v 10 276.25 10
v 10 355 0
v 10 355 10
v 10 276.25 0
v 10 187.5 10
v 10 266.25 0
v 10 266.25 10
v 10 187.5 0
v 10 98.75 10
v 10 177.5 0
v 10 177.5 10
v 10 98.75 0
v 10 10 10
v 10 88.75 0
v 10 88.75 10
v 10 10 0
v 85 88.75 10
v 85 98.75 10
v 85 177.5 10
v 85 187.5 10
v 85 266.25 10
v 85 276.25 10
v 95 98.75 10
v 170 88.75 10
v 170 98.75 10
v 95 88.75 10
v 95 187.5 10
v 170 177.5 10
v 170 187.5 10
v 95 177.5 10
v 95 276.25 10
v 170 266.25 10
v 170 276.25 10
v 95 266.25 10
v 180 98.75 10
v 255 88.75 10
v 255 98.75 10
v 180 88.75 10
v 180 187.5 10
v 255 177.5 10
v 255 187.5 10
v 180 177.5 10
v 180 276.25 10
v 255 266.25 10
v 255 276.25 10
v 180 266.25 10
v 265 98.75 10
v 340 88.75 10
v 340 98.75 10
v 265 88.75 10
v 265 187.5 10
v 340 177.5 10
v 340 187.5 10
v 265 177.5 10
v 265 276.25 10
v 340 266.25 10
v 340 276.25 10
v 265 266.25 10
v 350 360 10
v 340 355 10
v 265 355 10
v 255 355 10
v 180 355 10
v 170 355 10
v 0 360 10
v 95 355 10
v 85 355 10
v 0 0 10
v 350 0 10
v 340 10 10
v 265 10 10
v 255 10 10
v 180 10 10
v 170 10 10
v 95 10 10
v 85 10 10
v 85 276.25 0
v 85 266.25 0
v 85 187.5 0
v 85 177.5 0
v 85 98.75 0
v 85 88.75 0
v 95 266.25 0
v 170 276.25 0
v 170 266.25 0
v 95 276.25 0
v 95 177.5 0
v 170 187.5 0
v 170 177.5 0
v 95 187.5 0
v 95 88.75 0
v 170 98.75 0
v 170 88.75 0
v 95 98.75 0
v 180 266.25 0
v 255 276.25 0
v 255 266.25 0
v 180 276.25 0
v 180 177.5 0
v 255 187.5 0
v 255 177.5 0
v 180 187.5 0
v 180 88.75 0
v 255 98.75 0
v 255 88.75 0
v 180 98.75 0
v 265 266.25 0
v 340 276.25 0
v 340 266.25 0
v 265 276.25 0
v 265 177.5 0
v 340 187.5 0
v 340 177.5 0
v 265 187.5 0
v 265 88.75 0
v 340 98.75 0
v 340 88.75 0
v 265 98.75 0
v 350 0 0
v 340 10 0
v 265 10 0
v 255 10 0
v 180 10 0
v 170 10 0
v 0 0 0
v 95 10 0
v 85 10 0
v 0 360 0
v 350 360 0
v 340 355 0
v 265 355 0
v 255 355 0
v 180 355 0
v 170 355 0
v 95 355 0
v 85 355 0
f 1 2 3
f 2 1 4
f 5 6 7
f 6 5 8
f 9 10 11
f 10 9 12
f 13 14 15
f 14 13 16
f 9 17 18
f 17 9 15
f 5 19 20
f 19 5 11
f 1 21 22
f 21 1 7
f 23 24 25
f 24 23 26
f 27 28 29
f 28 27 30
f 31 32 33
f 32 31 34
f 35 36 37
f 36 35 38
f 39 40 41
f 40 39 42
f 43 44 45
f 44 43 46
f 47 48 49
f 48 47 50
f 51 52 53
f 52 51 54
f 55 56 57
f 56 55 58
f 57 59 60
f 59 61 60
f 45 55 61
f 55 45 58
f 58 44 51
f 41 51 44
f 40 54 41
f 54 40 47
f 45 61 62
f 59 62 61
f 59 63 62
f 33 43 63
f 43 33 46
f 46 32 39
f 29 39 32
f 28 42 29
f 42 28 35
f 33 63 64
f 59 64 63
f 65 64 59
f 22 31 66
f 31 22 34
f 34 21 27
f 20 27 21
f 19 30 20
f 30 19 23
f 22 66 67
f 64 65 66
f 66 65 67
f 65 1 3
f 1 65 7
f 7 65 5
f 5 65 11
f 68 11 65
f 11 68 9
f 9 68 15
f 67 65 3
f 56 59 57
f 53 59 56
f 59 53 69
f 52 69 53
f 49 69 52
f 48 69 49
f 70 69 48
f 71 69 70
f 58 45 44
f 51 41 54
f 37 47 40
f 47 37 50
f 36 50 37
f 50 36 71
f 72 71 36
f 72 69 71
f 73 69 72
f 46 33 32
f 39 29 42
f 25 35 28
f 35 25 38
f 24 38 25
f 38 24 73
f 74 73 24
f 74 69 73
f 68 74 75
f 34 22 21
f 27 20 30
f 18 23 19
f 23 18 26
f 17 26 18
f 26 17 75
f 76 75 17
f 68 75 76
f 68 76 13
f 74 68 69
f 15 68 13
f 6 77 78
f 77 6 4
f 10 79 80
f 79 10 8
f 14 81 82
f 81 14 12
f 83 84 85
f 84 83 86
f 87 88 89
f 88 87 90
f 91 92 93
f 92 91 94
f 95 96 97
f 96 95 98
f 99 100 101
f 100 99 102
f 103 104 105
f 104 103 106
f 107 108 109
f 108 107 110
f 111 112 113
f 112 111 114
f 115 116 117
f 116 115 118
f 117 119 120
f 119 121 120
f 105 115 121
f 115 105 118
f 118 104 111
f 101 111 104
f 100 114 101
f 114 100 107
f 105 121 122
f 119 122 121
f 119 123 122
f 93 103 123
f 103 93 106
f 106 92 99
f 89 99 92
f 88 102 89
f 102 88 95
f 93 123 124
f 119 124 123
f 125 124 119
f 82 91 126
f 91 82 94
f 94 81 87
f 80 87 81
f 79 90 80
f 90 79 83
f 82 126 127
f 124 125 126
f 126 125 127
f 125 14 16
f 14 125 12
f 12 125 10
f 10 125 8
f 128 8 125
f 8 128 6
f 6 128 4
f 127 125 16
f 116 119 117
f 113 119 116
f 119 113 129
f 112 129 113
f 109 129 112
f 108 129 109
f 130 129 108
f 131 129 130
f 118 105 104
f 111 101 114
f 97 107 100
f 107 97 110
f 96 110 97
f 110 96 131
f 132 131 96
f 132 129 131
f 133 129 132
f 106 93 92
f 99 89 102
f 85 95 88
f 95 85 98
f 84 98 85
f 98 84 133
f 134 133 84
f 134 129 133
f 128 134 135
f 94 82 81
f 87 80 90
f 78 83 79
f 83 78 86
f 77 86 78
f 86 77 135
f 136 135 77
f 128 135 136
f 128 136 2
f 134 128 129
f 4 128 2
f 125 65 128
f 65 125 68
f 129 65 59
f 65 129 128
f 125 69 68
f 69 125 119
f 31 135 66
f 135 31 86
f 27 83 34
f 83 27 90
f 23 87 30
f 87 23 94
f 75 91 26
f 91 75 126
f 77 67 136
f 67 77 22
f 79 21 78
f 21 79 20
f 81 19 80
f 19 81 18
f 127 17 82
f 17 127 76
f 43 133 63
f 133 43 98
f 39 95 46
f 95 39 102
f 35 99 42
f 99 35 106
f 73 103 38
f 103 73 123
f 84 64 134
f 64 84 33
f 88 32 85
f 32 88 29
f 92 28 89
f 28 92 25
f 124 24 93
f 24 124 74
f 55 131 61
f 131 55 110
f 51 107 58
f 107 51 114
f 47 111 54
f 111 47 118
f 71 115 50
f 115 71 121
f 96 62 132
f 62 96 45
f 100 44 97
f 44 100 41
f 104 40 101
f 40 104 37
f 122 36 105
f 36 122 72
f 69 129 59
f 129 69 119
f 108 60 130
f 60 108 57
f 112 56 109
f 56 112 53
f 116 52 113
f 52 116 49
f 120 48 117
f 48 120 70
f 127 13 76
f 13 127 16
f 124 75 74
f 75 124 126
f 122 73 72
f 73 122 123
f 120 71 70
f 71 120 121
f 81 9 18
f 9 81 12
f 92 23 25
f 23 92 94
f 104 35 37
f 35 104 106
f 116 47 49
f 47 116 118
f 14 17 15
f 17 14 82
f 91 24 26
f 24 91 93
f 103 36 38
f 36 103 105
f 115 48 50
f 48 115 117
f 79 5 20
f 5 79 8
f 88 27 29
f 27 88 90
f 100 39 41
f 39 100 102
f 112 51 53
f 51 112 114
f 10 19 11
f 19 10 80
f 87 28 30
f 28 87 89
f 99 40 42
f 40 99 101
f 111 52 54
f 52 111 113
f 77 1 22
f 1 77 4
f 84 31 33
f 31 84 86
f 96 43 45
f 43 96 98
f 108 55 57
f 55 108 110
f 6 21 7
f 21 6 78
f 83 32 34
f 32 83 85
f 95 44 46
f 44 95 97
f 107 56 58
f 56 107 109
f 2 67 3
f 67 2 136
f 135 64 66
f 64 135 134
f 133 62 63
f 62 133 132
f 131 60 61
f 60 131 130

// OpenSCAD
// face_band.scad reused for left upper band

width = 350;
band_h = 360;
thk = 10;
full_height = 720;
h_bar_count = 9;
h_gap = (full_height - h_bar_count * thk) / (h_bar_count - 1);
v_gap_count = 4;
v_bars = v_gap_count + 1;
v_gap = (width - v_bars * thk) / v_gap_count;
$fn = 32;

module face_band(w=width, bh=band_h, t=thk) {
    union() {
        for (i = [0 : v_bars - 1]) {
            x = i * (t + v_gap);
            translate([x, 0, 0]) cube([t, bh, t]);
        }
        for (j = [0 : h_bar_count - 1]) {
            y_full = j * (t + h_gap);
            if (y_full < bh && (y_full + t) > 0) {
                intersection() {
                    translate([0, y_full, 0]) cube([w, t, t]);
                    translate([0, 0, 0]) cube([w, bh, t]);
                }
            }
        }
    }
}

face_band();
